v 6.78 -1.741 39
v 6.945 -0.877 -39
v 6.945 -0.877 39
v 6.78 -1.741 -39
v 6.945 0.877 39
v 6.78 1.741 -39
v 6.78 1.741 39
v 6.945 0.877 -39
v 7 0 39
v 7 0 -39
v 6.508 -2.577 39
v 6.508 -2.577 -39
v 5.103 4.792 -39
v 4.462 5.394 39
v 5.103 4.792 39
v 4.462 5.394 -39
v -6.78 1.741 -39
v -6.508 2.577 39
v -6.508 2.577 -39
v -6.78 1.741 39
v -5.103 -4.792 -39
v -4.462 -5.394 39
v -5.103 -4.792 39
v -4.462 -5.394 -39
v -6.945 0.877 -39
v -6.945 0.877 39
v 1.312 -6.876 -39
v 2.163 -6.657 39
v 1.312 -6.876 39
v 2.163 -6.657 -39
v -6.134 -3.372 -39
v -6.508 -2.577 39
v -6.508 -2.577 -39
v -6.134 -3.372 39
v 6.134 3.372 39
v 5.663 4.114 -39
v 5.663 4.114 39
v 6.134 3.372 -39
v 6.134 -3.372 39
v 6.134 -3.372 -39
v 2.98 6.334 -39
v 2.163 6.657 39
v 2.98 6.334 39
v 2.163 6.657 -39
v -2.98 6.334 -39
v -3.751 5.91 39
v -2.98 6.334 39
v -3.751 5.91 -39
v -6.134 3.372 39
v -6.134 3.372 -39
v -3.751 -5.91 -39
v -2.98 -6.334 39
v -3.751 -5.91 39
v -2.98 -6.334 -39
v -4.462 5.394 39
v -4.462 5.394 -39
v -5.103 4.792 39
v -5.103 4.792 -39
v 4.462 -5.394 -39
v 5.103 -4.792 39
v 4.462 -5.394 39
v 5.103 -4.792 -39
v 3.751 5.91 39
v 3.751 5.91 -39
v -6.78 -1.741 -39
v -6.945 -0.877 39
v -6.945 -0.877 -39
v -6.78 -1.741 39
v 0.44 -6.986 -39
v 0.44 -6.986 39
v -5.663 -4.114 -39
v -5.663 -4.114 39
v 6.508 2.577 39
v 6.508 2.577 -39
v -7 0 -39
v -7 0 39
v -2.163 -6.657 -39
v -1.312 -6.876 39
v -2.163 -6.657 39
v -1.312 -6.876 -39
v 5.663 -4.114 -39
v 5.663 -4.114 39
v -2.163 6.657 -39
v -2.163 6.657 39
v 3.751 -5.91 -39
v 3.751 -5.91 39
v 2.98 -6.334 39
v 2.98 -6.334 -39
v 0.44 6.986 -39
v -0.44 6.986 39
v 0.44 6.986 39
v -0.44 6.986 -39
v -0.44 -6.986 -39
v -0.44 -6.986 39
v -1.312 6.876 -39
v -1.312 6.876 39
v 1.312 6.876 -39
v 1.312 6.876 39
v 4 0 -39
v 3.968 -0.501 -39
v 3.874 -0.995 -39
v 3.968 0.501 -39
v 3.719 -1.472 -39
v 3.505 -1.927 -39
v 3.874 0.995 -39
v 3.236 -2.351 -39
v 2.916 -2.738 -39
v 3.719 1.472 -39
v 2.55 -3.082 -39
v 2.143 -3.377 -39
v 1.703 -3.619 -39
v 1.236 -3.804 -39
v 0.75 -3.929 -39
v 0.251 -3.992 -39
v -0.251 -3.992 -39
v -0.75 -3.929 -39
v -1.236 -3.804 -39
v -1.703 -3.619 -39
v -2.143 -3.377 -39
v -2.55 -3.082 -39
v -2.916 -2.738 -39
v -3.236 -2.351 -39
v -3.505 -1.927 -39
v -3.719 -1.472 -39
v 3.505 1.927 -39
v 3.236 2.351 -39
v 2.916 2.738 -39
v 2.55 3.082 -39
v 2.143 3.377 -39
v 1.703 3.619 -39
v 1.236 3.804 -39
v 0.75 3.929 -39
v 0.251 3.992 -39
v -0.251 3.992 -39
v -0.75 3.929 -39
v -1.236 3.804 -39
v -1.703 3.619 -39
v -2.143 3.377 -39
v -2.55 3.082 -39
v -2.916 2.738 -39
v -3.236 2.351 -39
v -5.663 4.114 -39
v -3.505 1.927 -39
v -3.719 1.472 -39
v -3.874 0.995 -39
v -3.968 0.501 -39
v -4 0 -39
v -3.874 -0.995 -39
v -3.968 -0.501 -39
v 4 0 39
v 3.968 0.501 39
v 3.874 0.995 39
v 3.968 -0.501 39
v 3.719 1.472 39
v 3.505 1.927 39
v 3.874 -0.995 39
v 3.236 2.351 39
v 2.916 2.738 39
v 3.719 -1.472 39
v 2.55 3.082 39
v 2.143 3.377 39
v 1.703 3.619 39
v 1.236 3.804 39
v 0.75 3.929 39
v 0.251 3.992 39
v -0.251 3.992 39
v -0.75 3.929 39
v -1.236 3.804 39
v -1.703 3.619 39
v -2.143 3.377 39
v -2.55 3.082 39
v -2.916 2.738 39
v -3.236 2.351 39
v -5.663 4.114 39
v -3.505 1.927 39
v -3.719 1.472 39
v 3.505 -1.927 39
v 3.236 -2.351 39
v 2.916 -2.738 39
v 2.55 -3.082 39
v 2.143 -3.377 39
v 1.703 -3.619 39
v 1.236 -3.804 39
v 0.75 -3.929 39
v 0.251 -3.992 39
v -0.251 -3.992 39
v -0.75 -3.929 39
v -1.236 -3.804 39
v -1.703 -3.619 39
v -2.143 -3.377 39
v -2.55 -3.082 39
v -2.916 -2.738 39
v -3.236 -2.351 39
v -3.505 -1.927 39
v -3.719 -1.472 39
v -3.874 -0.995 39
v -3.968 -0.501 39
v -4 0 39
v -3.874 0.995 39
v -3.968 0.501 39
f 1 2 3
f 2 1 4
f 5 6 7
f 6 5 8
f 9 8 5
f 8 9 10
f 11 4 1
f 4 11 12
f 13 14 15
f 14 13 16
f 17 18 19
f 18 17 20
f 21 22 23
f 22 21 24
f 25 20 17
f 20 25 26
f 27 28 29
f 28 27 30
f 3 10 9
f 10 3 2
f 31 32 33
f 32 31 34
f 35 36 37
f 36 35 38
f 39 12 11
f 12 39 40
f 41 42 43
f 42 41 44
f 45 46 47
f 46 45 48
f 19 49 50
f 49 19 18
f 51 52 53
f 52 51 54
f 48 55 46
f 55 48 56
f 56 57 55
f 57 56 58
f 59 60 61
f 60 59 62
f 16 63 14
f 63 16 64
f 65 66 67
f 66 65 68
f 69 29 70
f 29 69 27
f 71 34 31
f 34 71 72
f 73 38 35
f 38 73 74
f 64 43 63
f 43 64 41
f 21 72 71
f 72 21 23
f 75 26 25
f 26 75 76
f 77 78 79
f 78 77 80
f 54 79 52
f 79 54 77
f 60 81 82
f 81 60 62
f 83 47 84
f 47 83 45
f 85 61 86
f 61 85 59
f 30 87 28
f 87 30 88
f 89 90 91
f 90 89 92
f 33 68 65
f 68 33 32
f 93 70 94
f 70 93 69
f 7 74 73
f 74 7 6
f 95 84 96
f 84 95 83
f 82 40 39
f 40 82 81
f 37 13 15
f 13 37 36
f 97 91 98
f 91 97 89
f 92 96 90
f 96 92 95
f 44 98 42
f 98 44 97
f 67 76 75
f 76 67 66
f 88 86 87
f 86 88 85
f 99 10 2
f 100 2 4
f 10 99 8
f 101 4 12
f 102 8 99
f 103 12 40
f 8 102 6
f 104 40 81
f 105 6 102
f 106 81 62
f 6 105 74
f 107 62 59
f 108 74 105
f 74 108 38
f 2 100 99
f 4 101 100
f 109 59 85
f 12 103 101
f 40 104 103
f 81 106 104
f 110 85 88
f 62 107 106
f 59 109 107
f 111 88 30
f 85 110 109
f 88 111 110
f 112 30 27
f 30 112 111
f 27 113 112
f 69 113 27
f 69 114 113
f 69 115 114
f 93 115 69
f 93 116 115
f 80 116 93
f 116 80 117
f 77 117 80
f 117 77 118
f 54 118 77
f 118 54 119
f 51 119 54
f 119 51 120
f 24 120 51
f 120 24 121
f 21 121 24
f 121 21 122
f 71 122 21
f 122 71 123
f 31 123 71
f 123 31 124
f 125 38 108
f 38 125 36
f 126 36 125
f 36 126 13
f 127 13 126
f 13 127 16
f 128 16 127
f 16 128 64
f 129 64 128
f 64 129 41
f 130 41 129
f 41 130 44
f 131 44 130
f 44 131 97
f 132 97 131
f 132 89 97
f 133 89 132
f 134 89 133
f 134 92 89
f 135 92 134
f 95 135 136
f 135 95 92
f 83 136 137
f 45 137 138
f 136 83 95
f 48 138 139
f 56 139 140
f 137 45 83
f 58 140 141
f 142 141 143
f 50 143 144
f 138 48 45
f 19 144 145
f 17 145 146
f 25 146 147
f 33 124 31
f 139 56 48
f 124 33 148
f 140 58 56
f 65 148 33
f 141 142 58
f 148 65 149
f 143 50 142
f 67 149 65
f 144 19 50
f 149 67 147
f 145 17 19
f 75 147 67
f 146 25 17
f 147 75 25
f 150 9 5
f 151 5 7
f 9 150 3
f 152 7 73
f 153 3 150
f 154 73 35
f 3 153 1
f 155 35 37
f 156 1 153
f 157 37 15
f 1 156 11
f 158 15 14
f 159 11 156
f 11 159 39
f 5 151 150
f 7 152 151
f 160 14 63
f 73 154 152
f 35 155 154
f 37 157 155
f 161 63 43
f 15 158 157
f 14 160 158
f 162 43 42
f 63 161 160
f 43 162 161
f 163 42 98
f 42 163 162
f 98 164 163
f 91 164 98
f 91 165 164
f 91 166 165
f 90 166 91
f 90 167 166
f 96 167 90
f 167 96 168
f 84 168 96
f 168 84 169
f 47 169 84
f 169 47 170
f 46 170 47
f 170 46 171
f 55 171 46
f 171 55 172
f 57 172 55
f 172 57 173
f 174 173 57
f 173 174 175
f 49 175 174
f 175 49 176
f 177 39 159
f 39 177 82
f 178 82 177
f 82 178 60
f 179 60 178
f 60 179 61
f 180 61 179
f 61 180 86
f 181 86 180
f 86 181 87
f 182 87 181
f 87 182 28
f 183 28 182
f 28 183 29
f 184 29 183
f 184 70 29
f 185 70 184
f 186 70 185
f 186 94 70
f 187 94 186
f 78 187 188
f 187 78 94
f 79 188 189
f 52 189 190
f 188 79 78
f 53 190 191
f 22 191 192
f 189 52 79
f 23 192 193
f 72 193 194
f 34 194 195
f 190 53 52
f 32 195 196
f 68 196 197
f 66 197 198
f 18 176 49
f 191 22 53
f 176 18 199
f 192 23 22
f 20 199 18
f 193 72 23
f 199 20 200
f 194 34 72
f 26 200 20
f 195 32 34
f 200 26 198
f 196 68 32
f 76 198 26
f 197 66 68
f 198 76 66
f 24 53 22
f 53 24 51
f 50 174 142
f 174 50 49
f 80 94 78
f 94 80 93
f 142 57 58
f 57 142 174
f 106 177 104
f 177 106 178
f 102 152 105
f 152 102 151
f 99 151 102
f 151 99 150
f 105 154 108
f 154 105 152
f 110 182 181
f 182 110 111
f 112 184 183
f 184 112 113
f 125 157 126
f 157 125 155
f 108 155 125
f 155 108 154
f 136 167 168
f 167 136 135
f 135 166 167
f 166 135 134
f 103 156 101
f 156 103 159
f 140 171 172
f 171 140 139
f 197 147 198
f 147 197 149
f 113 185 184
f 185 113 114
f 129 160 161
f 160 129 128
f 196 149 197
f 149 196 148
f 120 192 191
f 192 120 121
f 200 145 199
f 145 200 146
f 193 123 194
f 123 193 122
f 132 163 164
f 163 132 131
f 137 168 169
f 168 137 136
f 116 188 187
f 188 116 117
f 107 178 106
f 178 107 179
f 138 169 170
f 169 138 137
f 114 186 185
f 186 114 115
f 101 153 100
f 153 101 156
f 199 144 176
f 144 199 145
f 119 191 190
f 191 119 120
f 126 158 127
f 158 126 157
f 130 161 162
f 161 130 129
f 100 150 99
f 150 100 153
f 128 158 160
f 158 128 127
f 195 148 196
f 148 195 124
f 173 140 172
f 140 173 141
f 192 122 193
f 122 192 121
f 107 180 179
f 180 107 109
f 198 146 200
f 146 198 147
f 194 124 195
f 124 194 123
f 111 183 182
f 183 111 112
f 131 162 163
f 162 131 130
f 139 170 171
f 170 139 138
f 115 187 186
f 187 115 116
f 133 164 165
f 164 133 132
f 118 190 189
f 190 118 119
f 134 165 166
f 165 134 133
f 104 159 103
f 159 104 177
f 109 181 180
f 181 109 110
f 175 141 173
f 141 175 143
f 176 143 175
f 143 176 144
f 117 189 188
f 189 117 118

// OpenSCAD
$fn = 50;


difference() {
	union() {
		translate(v = [0, 0, -39.0000000000]) {
			cylinder(h = 78, r = 7.0000000000);
		}
	}
	union() {
		translate(v = [0, 0, -100.0000000000]) {
			cylinder(h = 200, r = 4.0000000000);
		}
	}
}
